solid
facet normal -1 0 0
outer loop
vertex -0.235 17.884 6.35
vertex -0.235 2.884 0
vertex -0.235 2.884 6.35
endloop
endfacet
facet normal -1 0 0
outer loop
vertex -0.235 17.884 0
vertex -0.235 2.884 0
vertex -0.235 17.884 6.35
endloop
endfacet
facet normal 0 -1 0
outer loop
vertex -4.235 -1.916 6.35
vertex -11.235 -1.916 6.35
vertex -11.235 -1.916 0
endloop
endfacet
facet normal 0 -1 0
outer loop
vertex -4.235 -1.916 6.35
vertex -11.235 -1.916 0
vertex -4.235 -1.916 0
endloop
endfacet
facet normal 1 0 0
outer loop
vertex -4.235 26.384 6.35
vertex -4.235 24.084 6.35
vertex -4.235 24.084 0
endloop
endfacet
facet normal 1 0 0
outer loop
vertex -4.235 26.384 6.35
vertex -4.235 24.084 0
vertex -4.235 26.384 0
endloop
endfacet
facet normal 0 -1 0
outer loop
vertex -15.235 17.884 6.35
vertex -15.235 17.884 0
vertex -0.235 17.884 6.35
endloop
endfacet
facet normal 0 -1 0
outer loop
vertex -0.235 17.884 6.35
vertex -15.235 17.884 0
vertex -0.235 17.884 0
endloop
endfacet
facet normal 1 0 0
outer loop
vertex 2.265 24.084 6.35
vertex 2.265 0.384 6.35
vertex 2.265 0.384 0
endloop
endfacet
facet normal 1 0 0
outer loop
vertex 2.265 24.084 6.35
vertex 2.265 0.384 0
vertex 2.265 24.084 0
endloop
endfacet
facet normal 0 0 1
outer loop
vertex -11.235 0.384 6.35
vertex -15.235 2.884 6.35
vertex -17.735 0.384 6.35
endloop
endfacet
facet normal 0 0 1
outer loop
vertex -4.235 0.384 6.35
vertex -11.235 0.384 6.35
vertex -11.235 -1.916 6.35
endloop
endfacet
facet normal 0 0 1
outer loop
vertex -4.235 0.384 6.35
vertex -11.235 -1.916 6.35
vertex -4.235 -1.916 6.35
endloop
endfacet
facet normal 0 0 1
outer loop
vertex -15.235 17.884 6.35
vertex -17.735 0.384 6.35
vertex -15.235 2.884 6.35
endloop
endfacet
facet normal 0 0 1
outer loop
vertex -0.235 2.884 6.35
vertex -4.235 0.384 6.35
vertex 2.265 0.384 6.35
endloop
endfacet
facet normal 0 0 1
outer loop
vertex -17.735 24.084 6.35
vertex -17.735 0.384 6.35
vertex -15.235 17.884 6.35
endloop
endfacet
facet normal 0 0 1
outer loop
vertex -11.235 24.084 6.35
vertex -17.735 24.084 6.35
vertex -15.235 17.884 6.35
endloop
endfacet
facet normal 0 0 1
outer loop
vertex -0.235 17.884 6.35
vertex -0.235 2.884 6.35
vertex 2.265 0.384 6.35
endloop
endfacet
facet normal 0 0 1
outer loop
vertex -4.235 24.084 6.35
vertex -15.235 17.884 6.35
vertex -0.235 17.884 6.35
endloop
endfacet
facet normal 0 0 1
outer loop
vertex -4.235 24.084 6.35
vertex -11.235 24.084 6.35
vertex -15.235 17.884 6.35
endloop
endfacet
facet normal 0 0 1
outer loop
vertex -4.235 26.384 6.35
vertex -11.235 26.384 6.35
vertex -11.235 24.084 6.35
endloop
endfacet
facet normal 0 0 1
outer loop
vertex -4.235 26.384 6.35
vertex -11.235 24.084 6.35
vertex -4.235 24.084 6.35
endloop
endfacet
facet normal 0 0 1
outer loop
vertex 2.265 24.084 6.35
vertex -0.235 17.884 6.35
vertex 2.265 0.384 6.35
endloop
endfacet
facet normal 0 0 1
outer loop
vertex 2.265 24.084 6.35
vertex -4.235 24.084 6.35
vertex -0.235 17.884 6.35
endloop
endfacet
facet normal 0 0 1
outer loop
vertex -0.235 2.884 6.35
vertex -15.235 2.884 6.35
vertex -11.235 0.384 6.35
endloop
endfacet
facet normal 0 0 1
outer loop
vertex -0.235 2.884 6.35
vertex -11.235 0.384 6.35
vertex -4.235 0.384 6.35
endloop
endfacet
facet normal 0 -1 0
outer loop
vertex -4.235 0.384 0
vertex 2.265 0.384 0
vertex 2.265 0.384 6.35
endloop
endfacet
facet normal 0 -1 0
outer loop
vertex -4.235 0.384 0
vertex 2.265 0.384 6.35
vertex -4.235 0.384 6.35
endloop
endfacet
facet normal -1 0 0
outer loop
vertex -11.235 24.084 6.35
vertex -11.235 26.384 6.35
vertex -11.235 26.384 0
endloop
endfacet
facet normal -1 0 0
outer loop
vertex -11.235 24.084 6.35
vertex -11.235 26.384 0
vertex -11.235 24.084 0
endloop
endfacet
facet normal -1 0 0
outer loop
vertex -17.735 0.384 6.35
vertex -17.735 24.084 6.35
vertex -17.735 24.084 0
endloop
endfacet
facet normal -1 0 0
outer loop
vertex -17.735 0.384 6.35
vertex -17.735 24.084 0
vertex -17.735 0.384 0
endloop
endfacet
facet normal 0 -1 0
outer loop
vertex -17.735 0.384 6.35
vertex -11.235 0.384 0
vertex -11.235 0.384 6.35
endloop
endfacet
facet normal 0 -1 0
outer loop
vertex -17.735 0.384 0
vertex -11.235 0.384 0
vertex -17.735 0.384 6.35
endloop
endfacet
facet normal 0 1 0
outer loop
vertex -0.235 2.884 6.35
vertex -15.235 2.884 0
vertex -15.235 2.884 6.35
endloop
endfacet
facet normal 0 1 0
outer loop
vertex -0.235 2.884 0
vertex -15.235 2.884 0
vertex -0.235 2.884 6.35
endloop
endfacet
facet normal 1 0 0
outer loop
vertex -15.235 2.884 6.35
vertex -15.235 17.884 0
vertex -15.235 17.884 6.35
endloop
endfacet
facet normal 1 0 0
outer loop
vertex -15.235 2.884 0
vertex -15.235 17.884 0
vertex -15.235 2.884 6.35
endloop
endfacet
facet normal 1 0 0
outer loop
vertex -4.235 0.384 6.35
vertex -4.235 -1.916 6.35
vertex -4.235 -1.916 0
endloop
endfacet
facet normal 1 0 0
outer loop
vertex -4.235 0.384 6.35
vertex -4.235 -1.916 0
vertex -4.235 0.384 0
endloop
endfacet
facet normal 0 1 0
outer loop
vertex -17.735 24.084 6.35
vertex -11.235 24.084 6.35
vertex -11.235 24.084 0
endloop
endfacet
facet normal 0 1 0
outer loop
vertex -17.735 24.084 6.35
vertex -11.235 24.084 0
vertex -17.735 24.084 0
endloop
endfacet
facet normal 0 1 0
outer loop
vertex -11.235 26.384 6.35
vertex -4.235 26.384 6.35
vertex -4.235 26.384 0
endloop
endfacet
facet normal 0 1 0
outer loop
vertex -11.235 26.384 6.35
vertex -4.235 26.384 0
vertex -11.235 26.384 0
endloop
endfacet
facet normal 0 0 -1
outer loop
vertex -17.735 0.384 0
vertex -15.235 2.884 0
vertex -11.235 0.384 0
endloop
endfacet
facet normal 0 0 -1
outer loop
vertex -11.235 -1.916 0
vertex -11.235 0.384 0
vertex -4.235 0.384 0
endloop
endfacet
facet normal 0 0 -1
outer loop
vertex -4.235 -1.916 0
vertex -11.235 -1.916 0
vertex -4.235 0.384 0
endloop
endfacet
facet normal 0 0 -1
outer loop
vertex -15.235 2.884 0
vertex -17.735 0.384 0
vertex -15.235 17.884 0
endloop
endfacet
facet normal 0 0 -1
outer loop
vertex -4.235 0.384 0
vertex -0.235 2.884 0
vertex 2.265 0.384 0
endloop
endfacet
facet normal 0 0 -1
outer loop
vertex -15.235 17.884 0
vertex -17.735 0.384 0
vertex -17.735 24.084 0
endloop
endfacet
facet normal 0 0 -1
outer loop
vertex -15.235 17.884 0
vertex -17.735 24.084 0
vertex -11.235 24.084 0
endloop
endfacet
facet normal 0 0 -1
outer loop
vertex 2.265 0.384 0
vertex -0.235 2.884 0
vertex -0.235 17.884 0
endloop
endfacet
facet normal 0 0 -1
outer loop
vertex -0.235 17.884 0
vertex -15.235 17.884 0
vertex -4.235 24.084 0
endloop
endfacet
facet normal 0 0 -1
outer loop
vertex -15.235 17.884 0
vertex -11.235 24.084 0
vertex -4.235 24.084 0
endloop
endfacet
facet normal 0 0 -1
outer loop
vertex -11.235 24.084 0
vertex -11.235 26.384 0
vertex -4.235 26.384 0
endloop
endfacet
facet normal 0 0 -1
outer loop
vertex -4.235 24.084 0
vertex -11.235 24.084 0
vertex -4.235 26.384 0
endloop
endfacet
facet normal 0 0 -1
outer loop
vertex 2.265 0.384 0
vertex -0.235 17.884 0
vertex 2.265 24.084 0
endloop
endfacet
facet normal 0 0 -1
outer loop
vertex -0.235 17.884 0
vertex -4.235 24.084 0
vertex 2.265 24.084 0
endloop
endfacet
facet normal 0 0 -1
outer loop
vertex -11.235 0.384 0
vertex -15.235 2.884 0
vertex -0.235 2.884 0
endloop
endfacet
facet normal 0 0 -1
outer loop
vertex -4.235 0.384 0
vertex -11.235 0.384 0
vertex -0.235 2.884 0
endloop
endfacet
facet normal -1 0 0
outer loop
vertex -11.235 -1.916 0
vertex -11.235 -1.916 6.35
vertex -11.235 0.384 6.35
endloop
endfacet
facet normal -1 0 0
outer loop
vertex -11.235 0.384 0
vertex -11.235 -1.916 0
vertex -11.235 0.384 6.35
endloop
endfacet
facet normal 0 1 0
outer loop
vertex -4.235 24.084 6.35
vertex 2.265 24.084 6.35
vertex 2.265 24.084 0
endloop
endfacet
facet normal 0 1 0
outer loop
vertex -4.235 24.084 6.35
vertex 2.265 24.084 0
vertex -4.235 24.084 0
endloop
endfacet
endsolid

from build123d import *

# Parameters (mm, degrees)
BOSS_EXTRUDE1_DEPTH = 6.35
SKETCH2_W           = 20
SKETCH2_H           = 2.5
BOSS_EXTRUDE2_DEPTH = 6.35
SKETCH4_W           = 7
SKETCH4_H           = 2.3
BOSS_EXTRUDE3_DEPTH = 6.35


with BuildPart() as part:
    # Sketch1 → Boss-Extrude1 (new body)
    with BuildSketch(Plane.XY):
        Polygon((-15.235299292, 17.883619427), (-15.235299292, 2.883619427), (-0.235299292, 2.883619427), (-0.235299292, 17.883619427), (2.264700708, 17.883619427), (2.264700708, 0.383619427), (-17.735299292, 0.383619427), (-17.735299292, 17.883619427), align=None)
    extrude(amount=BOSS_EXTRUDE1_DEPTH)

    # Sketch2 → Boss-Extrude2 (add, through all)
    with BuildSketch(Plane.XY):
        with Locations((-7.735299292, 19.133619427)):
            Rectangle(SKETCH2_W, SKETCH2_H)
    extrude(amount=BOSS_EXTRUDE2_DEPTH)

    # Sketch4 → Boss-Extrude3 (add)
    with BuildSketch(Plane.XY.offset(6.35)):
        Polygon((-17.735299292, 20.383619427), (2.264700708, 20.383619427), (2.264700708, 24.083619427), (-4.235299292, 24.083619427), (-4.235299292, 26.383619427), (-11.235299292, 26.383619427), (-11.235299292, 24.083619427), (-17.735299292, 24.083619427), align=None)
        with Locations((-7.735299292, -0.766380573)):
            Rectangle(SKETCH4_W, SKETCH4_H)
    extrude(amount=-BOSS_EXTRUDE3_DEPTH)


solid = part.part
